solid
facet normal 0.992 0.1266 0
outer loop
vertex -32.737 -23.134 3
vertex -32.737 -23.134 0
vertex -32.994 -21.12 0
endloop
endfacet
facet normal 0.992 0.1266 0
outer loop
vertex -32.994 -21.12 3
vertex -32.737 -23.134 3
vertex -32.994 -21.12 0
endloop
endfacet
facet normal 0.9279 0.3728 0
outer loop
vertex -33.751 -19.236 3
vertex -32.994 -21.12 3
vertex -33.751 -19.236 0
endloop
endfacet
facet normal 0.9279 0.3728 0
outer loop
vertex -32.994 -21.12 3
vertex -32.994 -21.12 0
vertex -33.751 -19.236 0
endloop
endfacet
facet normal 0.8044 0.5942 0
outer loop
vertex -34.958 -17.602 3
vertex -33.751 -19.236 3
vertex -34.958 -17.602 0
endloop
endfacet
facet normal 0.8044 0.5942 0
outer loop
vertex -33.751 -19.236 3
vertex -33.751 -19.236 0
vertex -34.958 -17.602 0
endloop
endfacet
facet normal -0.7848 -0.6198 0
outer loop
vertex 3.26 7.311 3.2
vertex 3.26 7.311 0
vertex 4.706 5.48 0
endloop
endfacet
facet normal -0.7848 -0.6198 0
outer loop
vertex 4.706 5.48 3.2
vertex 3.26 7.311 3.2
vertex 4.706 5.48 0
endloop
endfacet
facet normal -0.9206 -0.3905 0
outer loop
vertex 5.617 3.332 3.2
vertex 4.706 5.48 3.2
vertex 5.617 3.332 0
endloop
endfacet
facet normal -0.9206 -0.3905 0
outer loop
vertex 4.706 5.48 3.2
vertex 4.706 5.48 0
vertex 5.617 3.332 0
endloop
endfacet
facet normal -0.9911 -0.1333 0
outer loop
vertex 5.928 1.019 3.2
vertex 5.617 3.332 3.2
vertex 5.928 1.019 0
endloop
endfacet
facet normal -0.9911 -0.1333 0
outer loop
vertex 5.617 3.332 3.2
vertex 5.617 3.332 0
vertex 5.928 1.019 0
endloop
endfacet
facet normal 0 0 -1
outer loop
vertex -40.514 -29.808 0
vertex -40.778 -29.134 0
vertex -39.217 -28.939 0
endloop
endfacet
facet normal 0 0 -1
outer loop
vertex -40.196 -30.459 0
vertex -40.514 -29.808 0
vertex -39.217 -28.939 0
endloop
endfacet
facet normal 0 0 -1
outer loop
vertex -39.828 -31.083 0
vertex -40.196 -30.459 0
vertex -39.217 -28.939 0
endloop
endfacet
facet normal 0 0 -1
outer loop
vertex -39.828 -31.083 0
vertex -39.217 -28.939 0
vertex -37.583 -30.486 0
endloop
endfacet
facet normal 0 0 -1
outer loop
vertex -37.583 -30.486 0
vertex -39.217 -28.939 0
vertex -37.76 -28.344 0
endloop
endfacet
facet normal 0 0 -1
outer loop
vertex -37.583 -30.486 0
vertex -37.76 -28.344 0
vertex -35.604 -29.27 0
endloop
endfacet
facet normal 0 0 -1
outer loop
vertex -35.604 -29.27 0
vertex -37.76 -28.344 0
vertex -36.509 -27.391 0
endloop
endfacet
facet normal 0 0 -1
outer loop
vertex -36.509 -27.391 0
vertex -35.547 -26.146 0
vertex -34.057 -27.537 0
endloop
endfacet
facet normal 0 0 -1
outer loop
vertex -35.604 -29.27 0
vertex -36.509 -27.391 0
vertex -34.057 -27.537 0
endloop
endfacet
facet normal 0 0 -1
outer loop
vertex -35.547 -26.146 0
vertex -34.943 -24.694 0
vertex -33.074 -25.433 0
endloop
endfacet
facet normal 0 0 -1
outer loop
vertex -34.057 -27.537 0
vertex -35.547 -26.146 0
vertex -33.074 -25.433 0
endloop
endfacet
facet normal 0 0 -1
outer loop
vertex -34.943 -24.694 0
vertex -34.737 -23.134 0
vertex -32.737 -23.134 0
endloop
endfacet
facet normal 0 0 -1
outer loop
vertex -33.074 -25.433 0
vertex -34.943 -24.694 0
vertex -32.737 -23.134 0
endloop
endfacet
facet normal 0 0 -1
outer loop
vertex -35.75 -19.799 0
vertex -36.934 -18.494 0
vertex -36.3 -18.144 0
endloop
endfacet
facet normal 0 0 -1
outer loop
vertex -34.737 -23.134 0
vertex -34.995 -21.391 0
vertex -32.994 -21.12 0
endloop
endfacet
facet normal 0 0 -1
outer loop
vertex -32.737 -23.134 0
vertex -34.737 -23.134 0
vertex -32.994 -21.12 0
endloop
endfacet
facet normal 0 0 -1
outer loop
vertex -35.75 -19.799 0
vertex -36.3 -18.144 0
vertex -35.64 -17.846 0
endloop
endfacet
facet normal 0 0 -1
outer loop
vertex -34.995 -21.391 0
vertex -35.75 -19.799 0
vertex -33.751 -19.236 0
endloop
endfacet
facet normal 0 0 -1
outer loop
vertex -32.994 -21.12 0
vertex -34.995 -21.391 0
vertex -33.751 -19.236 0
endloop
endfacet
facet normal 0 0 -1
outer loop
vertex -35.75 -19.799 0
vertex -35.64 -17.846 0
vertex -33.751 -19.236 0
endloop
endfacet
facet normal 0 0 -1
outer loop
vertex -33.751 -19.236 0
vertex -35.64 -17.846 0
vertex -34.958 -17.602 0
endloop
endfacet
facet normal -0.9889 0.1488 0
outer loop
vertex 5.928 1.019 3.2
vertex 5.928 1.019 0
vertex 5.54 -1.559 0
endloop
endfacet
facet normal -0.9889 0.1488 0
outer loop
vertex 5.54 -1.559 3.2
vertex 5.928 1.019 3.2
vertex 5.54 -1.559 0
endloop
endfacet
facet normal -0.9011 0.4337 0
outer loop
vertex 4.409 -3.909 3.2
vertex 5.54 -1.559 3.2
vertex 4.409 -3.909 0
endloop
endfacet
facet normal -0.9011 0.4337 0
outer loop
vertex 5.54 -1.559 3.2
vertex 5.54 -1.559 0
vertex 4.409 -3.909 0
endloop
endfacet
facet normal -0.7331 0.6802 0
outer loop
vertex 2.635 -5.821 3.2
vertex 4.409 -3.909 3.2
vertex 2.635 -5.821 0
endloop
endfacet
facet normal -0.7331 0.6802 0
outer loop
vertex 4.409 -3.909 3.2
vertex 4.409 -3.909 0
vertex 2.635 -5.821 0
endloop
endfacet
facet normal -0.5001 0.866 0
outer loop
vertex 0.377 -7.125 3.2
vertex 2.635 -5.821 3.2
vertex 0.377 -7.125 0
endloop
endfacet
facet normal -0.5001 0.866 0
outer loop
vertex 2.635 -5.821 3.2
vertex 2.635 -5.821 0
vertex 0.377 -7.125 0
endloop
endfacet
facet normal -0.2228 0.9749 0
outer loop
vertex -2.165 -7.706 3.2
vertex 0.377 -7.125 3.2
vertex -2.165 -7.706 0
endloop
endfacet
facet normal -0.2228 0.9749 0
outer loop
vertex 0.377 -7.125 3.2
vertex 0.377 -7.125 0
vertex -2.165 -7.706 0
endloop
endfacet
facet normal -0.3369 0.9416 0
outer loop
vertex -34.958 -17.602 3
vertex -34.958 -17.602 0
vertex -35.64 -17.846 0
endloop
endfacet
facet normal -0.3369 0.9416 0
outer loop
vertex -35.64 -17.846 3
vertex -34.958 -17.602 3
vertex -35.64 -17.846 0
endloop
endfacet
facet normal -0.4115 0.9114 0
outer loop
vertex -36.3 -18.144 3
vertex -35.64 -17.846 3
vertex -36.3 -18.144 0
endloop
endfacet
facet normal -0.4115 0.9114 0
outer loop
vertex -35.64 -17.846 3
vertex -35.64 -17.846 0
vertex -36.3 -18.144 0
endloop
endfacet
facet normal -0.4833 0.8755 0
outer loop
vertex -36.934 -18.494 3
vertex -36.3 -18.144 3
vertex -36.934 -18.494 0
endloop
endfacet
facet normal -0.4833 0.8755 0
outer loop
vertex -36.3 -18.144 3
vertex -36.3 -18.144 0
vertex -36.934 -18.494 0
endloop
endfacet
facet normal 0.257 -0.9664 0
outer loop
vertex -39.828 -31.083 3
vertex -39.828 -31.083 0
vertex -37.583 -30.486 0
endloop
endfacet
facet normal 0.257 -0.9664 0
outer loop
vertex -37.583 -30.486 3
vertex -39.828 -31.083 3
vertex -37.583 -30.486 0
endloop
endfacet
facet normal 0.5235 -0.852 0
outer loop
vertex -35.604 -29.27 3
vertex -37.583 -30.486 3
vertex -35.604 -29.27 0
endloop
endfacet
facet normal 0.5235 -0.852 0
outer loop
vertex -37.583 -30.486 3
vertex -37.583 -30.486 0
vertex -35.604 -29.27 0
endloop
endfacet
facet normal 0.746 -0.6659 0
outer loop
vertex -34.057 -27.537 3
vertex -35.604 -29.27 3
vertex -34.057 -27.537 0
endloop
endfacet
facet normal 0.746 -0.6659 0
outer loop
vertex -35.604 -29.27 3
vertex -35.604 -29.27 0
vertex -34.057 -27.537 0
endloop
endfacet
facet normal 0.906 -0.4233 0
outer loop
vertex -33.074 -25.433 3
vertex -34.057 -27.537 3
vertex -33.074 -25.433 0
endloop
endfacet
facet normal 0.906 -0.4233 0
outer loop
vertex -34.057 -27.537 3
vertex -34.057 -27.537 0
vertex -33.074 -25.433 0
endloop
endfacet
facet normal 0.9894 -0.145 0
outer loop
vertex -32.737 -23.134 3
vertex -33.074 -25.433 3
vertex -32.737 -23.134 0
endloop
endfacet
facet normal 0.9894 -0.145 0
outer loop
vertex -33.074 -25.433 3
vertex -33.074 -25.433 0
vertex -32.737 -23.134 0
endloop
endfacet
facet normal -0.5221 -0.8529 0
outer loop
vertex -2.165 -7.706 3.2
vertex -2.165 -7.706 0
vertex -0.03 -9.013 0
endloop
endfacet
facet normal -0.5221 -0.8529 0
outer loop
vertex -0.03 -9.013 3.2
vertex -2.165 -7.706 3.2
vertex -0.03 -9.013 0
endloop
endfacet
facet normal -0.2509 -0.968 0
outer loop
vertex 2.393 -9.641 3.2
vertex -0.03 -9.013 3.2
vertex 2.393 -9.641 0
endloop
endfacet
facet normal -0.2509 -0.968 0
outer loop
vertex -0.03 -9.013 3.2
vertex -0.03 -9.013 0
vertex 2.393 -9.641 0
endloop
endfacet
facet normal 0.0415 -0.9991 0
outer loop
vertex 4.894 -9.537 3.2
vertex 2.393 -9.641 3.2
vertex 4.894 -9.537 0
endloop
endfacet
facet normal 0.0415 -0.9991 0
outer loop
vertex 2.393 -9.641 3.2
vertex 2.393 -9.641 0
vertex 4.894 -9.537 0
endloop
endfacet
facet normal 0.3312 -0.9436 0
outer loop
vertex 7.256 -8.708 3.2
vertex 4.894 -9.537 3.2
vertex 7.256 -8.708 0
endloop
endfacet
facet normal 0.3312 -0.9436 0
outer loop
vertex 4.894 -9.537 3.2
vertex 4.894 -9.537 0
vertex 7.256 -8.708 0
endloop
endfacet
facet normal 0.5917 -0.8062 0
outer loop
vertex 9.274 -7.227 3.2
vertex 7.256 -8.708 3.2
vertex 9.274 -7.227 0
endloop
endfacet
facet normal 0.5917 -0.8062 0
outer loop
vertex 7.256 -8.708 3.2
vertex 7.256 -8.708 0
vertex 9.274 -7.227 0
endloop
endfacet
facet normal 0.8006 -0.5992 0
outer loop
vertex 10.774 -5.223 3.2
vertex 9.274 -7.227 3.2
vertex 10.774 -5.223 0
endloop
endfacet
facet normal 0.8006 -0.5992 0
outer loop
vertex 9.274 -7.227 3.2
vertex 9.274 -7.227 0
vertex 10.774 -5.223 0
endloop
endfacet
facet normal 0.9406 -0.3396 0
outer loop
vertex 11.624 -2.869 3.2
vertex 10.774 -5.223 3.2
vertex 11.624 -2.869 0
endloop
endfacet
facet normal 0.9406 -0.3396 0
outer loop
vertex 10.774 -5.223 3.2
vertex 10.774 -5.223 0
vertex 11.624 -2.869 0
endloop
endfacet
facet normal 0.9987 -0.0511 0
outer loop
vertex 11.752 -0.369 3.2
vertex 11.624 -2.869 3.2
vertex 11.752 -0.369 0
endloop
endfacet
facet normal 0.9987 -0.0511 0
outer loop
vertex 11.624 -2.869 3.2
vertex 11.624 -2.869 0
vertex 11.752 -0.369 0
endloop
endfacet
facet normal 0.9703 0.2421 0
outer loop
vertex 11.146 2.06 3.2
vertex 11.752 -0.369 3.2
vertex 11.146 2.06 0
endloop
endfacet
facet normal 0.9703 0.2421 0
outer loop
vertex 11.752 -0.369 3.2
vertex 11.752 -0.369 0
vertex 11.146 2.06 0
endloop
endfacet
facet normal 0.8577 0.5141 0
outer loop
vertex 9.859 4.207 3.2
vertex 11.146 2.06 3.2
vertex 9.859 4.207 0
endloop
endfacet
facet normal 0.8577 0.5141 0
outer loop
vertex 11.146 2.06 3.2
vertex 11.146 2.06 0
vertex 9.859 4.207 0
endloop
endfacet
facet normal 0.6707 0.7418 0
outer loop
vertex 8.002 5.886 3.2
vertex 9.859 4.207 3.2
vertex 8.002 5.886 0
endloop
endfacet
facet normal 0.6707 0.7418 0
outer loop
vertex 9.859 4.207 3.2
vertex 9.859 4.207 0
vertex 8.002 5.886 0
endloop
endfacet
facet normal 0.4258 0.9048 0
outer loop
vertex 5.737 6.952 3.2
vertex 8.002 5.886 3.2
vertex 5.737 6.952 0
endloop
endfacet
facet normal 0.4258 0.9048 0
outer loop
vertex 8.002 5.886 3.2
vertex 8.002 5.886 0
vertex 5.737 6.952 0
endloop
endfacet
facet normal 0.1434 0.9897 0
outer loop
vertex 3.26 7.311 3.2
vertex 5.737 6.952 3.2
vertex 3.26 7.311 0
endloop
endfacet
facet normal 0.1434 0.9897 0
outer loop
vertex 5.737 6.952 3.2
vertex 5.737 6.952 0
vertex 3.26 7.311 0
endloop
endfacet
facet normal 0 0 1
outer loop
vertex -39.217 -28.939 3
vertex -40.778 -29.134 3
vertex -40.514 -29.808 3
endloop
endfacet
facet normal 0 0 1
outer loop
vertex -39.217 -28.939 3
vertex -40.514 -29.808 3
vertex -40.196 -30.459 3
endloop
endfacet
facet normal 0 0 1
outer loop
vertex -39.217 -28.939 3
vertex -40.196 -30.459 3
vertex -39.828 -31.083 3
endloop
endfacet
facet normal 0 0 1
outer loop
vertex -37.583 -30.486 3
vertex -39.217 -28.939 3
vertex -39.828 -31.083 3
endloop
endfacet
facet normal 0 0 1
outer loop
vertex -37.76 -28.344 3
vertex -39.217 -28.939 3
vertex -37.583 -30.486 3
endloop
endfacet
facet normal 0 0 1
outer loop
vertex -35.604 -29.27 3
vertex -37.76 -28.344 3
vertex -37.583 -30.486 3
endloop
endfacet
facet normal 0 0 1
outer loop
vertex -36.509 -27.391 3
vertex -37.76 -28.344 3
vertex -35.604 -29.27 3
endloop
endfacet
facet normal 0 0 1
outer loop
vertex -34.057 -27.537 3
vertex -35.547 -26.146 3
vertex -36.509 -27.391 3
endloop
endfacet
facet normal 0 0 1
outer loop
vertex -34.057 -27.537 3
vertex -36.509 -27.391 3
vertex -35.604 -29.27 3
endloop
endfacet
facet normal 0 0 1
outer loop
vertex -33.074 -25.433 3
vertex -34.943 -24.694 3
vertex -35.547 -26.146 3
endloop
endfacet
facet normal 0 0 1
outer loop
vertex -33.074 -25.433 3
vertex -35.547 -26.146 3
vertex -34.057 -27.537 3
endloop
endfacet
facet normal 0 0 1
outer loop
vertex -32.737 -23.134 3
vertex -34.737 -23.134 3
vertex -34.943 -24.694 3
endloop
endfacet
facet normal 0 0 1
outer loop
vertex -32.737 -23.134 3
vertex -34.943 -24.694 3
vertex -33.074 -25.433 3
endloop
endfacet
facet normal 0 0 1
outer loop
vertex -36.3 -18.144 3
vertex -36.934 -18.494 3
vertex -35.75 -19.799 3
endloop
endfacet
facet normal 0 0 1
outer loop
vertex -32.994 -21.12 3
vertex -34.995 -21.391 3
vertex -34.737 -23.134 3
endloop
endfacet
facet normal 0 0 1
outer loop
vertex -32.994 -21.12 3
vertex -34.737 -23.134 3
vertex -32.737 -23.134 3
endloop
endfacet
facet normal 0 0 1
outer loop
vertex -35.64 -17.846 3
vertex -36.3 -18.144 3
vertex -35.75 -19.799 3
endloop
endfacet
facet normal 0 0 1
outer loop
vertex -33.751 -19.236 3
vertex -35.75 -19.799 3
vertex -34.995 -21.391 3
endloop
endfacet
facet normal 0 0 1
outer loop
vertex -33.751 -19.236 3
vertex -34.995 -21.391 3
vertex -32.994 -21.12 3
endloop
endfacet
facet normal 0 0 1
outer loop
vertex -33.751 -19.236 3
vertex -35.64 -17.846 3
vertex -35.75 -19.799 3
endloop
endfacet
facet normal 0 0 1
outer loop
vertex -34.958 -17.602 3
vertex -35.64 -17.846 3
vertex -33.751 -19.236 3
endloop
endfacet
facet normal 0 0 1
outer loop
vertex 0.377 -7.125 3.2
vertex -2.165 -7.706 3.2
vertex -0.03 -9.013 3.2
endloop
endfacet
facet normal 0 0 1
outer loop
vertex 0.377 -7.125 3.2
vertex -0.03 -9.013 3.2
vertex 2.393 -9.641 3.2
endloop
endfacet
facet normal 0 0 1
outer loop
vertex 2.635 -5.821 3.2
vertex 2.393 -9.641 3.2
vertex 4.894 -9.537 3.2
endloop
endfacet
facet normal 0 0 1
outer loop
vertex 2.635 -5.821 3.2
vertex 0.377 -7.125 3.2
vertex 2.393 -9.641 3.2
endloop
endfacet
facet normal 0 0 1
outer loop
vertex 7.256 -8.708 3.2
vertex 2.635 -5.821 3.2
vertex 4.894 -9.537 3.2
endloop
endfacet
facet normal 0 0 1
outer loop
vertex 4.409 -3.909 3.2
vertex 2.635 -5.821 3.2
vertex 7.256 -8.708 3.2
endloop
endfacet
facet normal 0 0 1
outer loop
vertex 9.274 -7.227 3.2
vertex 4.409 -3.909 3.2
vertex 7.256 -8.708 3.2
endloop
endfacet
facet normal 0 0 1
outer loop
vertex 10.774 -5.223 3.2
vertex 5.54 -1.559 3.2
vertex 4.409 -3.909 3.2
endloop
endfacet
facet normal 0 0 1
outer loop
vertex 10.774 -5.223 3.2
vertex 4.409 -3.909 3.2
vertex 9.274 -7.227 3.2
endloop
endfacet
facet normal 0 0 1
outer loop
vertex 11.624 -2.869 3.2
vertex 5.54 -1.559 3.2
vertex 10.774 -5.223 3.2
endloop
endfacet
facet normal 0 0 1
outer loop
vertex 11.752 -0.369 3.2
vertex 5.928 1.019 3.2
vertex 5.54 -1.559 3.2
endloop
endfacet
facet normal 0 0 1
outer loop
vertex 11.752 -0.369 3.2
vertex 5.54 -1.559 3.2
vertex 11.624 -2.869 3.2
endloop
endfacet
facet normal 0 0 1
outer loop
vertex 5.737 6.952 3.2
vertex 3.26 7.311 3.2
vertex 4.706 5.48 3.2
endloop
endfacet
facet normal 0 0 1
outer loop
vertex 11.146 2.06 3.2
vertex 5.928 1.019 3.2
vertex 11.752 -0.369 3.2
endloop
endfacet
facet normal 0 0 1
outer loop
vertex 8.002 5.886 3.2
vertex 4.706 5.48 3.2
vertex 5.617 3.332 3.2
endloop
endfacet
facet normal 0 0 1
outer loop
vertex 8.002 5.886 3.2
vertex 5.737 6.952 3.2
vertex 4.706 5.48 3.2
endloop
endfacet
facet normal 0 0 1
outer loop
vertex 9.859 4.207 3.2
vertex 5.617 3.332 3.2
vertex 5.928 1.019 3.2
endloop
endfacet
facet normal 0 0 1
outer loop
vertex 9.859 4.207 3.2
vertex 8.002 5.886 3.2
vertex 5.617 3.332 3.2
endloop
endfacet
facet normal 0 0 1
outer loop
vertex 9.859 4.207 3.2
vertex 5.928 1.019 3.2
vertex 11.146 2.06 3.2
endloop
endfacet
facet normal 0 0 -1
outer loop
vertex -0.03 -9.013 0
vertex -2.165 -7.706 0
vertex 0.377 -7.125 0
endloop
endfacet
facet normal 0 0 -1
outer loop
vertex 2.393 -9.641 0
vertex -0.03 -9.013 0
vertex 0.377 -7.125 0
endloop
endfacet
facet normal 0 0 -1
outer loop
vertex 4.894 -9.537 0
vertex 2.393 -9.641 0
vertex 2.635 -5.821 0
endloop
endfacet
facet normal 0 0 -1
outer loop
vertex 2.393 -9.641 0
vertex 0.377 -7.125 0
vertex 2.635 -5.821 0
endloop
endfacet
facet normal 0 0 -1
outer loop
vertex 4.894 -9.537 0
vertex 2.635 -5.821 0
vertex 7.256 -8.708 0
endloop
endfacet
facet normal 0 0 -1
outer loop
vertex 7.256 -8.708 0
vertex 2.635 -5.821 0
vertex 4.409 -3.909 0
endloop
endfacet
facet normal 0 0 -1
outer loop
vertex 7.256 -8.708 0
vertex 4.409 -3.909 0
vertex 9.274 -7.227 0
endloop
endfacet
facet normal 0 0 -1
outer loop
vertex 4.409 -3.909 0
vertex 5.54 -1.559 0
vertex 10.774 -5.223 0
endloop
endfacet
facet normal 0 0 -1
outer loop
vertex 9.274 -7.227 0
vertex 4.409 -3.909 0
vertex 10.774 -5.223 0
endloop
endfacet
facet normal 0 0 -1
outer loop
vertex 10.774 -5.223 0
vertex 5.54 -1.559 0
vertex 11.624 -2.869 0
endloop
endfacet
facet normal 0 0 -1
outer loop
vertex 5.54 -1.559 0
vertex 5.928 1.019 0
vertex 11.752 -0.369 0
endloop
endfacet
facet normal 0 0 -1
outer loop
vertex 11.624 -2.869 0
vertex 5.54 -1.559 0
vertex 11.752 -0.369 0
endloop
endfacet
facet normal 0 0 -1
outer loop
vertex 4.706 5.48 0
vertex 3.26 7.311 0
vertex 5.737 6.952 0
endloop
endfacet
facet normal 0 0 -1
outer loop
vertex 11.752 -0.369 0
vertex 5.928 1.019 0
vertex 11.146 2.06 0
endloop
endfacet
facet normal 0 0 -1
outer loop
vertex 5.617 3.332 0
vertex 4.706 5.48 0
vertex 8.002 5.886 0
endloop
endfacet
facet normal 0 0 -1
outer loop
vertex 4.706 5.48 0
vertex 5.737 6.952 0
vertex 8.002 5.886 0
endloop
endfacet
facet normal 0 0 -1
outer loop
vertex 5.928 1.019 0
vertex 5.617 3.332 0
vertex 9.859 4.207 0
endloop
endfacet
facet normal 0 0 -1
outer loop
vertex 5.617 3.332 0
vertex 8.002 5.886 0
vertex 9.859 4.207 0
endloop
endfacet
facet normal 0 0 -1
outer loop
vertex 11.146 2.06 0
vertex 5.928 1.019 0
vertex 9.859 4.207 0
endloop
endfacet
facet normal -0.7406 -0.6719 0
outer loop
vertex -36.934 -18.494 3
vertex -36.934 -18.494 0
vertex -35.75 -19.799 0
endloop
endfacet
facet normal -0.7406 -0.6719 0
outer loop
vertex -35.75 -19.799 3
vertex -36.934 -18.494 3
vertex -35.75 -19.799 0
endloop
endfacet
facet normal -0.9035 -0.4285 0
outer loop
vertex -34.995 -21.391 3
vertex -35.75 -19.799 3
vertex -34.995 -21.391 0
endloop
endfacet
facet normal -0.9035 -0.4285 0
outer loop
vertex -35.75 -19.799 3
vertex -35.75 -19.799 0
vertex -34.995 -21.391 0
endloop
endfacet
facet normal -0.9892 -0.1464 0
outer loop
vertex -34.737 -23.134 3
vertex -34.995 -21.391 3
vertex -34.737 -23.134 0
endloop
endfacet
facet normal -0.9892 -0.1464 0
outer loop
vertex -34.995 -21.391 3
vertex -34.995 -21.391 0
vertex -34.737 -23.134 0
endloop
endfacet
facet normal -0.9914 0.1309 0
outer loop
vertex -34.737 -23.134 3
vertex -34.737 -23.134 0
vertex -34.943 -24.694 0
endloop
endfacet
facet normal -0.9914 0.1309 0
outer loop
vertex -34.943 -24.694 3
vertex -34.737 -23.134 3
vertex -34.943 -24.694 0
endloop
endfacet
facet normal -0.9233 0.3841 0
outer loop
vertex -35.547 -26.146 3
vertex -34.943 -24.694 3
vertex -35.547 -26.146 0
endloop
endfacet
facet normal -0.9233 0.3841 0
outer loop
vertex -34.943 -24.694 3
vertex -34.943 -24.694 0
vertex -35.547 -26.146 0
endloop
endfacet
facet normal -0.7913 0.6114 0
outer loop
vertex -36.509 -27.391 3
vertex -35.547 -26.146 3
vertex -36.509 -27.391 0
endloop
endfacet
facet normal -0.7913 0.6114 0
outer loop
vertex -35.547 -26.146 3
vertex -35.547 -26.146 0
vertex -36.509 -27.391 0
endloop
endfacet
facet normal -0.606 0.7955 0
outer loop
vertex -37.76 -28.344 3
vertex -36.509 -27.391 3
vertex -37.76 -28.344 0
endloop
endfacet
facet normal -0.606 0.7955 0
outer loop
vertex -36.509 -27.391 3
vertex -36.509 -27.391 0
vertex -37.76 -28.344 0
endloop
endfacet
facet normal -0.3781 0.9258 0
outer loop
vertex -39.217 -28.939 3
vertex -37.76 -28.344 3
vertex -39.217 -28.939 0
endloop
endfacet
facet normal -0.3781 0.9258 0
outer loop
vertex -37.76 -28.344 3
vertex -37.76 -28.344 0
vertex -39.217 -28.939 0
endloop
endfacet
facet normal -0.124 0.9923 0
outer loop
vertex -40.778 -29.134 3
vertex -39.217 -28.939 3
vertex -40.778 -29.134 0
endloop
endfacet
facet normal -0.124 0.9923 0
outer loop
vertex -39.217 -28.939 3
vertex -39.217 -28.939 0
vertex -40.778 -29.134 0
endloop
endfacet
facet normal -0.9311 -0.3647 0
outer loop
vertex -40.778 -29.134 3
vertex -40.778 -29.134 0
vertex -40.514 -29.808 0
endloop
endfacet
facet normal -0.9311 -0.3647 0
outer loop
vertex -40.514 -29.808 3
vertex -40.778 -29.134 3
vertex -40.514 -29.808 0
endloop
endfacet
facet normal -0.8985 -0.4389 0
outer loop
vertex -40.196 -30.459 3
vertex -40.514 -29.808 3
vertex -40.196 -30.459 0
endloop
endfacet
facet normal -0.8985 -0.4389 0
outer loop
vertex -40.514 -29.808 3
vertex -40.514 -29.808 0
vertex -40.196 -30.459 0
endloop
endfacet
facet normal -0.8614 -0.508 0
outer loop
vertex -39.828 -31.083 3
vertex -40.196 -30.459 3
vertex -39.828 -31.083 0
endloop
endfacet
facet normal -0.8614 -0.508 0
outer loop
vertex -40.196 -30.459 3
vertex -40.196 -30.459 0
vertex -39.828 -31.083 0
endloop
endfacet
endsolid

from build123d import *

# Parameters (mm, degrees)
F1_DEPTH = 3
F5_DEPTH = 3
F6_DEPTH = 3.2


with BuildPart() as f1:
    # F0 (on Top) → F1 (new body)
    with BuildSketch(Plane.XY):
        with BuildLine():
            Line((-40.4015687406, 36.8140898645), (-40.4015687406, 43.3875212363))
            ThreePointArc((-40.4015687406, 43.3875212363), (-46.4015687406, 45.7140898645), (-52.4015687406, 43.3875212363))
            Line((-52.4015687406, 43.3875212363), (-52.4015687406, 36.8140898645))
            Line((-52.4015687406, 36.8140898645), (-52.1643805543, 36.8140898645))
            ThreePointArc((-52.1643805543, 36.8140898645), (-46.4015687406, 40.9140898645), (-40.6387569269, 36.8140898645))
            Line((-40.6387569269, 36.8140898645), (-40.4015687406, 36.8140898645))
        make_face()
    extrude(amount=F1_DEPTH)


with BuildPart() as f5:
    # F2 (on Top) → F5 (new body)
    with BuildSketch(Plane.XY):
        with BuildLine():
            ThreePointArc((-32.7367236912, -23.1343470514), (-33.3127223538, -20.1537088408), (-34.9577747267, -17.602281536))
            ThreePointArc((-34.9577747267, -17.602281536), (-35.972667649, -17.9882107323), (-36.9336995487, -18.4935489119))
            ThreePointArc((-36.9336995487, -18.4935489119), (-35.3137104672, -20.5670668617), (-34.7367236912, -23.1343470514))
            ThreePointArc((-34.7367236912, -23.1343470514), (-36.5085976414, -27.3914528883), (-40.7777070602, -29.13420708))
            ThreePointArc((-40.7777070602, -29.13420708), (-40.3615238643, -30.1370732404), (-39.8276001695, -31.0825225919))
            ThreePointArc((-39.8276001695, -31.0825225919), (-34.7670927071, -28.4600869918), (-32.7367236912, -23.1343470514))
        make_face()
    extrude(amount=F5_DEPTH)


with BuildPart() as f6:
    # F3 (on Top) → F6 (new body)
    with BuildSketch(Plane.XY):
        with BuildLine():
            ThreePointArc((-2.1653392936, -7.7060639193), (6.8879251173, -8.8909829108), (11.7917856768, -1.189179153))
            ThreePointArc((11.7917856768, -1.189179153), (9.2907984687, 4.8326017732), (3.2595867301, 7.3107598602))
            ThreePointArc((3.2595867301, 7.3107598602), (5.233662666, 4.4363655949), (5.9284694199, 1.0192964169))
            ThreePointArc((5.9284694199, 1.0192964169), (3.5934586544, -4.9313685142), (-2.1653392936, -7.7060639193))
        make_face()
    extrude(amount=F6_DEPTH)


solid = Compound([f5.part, f6.part])
